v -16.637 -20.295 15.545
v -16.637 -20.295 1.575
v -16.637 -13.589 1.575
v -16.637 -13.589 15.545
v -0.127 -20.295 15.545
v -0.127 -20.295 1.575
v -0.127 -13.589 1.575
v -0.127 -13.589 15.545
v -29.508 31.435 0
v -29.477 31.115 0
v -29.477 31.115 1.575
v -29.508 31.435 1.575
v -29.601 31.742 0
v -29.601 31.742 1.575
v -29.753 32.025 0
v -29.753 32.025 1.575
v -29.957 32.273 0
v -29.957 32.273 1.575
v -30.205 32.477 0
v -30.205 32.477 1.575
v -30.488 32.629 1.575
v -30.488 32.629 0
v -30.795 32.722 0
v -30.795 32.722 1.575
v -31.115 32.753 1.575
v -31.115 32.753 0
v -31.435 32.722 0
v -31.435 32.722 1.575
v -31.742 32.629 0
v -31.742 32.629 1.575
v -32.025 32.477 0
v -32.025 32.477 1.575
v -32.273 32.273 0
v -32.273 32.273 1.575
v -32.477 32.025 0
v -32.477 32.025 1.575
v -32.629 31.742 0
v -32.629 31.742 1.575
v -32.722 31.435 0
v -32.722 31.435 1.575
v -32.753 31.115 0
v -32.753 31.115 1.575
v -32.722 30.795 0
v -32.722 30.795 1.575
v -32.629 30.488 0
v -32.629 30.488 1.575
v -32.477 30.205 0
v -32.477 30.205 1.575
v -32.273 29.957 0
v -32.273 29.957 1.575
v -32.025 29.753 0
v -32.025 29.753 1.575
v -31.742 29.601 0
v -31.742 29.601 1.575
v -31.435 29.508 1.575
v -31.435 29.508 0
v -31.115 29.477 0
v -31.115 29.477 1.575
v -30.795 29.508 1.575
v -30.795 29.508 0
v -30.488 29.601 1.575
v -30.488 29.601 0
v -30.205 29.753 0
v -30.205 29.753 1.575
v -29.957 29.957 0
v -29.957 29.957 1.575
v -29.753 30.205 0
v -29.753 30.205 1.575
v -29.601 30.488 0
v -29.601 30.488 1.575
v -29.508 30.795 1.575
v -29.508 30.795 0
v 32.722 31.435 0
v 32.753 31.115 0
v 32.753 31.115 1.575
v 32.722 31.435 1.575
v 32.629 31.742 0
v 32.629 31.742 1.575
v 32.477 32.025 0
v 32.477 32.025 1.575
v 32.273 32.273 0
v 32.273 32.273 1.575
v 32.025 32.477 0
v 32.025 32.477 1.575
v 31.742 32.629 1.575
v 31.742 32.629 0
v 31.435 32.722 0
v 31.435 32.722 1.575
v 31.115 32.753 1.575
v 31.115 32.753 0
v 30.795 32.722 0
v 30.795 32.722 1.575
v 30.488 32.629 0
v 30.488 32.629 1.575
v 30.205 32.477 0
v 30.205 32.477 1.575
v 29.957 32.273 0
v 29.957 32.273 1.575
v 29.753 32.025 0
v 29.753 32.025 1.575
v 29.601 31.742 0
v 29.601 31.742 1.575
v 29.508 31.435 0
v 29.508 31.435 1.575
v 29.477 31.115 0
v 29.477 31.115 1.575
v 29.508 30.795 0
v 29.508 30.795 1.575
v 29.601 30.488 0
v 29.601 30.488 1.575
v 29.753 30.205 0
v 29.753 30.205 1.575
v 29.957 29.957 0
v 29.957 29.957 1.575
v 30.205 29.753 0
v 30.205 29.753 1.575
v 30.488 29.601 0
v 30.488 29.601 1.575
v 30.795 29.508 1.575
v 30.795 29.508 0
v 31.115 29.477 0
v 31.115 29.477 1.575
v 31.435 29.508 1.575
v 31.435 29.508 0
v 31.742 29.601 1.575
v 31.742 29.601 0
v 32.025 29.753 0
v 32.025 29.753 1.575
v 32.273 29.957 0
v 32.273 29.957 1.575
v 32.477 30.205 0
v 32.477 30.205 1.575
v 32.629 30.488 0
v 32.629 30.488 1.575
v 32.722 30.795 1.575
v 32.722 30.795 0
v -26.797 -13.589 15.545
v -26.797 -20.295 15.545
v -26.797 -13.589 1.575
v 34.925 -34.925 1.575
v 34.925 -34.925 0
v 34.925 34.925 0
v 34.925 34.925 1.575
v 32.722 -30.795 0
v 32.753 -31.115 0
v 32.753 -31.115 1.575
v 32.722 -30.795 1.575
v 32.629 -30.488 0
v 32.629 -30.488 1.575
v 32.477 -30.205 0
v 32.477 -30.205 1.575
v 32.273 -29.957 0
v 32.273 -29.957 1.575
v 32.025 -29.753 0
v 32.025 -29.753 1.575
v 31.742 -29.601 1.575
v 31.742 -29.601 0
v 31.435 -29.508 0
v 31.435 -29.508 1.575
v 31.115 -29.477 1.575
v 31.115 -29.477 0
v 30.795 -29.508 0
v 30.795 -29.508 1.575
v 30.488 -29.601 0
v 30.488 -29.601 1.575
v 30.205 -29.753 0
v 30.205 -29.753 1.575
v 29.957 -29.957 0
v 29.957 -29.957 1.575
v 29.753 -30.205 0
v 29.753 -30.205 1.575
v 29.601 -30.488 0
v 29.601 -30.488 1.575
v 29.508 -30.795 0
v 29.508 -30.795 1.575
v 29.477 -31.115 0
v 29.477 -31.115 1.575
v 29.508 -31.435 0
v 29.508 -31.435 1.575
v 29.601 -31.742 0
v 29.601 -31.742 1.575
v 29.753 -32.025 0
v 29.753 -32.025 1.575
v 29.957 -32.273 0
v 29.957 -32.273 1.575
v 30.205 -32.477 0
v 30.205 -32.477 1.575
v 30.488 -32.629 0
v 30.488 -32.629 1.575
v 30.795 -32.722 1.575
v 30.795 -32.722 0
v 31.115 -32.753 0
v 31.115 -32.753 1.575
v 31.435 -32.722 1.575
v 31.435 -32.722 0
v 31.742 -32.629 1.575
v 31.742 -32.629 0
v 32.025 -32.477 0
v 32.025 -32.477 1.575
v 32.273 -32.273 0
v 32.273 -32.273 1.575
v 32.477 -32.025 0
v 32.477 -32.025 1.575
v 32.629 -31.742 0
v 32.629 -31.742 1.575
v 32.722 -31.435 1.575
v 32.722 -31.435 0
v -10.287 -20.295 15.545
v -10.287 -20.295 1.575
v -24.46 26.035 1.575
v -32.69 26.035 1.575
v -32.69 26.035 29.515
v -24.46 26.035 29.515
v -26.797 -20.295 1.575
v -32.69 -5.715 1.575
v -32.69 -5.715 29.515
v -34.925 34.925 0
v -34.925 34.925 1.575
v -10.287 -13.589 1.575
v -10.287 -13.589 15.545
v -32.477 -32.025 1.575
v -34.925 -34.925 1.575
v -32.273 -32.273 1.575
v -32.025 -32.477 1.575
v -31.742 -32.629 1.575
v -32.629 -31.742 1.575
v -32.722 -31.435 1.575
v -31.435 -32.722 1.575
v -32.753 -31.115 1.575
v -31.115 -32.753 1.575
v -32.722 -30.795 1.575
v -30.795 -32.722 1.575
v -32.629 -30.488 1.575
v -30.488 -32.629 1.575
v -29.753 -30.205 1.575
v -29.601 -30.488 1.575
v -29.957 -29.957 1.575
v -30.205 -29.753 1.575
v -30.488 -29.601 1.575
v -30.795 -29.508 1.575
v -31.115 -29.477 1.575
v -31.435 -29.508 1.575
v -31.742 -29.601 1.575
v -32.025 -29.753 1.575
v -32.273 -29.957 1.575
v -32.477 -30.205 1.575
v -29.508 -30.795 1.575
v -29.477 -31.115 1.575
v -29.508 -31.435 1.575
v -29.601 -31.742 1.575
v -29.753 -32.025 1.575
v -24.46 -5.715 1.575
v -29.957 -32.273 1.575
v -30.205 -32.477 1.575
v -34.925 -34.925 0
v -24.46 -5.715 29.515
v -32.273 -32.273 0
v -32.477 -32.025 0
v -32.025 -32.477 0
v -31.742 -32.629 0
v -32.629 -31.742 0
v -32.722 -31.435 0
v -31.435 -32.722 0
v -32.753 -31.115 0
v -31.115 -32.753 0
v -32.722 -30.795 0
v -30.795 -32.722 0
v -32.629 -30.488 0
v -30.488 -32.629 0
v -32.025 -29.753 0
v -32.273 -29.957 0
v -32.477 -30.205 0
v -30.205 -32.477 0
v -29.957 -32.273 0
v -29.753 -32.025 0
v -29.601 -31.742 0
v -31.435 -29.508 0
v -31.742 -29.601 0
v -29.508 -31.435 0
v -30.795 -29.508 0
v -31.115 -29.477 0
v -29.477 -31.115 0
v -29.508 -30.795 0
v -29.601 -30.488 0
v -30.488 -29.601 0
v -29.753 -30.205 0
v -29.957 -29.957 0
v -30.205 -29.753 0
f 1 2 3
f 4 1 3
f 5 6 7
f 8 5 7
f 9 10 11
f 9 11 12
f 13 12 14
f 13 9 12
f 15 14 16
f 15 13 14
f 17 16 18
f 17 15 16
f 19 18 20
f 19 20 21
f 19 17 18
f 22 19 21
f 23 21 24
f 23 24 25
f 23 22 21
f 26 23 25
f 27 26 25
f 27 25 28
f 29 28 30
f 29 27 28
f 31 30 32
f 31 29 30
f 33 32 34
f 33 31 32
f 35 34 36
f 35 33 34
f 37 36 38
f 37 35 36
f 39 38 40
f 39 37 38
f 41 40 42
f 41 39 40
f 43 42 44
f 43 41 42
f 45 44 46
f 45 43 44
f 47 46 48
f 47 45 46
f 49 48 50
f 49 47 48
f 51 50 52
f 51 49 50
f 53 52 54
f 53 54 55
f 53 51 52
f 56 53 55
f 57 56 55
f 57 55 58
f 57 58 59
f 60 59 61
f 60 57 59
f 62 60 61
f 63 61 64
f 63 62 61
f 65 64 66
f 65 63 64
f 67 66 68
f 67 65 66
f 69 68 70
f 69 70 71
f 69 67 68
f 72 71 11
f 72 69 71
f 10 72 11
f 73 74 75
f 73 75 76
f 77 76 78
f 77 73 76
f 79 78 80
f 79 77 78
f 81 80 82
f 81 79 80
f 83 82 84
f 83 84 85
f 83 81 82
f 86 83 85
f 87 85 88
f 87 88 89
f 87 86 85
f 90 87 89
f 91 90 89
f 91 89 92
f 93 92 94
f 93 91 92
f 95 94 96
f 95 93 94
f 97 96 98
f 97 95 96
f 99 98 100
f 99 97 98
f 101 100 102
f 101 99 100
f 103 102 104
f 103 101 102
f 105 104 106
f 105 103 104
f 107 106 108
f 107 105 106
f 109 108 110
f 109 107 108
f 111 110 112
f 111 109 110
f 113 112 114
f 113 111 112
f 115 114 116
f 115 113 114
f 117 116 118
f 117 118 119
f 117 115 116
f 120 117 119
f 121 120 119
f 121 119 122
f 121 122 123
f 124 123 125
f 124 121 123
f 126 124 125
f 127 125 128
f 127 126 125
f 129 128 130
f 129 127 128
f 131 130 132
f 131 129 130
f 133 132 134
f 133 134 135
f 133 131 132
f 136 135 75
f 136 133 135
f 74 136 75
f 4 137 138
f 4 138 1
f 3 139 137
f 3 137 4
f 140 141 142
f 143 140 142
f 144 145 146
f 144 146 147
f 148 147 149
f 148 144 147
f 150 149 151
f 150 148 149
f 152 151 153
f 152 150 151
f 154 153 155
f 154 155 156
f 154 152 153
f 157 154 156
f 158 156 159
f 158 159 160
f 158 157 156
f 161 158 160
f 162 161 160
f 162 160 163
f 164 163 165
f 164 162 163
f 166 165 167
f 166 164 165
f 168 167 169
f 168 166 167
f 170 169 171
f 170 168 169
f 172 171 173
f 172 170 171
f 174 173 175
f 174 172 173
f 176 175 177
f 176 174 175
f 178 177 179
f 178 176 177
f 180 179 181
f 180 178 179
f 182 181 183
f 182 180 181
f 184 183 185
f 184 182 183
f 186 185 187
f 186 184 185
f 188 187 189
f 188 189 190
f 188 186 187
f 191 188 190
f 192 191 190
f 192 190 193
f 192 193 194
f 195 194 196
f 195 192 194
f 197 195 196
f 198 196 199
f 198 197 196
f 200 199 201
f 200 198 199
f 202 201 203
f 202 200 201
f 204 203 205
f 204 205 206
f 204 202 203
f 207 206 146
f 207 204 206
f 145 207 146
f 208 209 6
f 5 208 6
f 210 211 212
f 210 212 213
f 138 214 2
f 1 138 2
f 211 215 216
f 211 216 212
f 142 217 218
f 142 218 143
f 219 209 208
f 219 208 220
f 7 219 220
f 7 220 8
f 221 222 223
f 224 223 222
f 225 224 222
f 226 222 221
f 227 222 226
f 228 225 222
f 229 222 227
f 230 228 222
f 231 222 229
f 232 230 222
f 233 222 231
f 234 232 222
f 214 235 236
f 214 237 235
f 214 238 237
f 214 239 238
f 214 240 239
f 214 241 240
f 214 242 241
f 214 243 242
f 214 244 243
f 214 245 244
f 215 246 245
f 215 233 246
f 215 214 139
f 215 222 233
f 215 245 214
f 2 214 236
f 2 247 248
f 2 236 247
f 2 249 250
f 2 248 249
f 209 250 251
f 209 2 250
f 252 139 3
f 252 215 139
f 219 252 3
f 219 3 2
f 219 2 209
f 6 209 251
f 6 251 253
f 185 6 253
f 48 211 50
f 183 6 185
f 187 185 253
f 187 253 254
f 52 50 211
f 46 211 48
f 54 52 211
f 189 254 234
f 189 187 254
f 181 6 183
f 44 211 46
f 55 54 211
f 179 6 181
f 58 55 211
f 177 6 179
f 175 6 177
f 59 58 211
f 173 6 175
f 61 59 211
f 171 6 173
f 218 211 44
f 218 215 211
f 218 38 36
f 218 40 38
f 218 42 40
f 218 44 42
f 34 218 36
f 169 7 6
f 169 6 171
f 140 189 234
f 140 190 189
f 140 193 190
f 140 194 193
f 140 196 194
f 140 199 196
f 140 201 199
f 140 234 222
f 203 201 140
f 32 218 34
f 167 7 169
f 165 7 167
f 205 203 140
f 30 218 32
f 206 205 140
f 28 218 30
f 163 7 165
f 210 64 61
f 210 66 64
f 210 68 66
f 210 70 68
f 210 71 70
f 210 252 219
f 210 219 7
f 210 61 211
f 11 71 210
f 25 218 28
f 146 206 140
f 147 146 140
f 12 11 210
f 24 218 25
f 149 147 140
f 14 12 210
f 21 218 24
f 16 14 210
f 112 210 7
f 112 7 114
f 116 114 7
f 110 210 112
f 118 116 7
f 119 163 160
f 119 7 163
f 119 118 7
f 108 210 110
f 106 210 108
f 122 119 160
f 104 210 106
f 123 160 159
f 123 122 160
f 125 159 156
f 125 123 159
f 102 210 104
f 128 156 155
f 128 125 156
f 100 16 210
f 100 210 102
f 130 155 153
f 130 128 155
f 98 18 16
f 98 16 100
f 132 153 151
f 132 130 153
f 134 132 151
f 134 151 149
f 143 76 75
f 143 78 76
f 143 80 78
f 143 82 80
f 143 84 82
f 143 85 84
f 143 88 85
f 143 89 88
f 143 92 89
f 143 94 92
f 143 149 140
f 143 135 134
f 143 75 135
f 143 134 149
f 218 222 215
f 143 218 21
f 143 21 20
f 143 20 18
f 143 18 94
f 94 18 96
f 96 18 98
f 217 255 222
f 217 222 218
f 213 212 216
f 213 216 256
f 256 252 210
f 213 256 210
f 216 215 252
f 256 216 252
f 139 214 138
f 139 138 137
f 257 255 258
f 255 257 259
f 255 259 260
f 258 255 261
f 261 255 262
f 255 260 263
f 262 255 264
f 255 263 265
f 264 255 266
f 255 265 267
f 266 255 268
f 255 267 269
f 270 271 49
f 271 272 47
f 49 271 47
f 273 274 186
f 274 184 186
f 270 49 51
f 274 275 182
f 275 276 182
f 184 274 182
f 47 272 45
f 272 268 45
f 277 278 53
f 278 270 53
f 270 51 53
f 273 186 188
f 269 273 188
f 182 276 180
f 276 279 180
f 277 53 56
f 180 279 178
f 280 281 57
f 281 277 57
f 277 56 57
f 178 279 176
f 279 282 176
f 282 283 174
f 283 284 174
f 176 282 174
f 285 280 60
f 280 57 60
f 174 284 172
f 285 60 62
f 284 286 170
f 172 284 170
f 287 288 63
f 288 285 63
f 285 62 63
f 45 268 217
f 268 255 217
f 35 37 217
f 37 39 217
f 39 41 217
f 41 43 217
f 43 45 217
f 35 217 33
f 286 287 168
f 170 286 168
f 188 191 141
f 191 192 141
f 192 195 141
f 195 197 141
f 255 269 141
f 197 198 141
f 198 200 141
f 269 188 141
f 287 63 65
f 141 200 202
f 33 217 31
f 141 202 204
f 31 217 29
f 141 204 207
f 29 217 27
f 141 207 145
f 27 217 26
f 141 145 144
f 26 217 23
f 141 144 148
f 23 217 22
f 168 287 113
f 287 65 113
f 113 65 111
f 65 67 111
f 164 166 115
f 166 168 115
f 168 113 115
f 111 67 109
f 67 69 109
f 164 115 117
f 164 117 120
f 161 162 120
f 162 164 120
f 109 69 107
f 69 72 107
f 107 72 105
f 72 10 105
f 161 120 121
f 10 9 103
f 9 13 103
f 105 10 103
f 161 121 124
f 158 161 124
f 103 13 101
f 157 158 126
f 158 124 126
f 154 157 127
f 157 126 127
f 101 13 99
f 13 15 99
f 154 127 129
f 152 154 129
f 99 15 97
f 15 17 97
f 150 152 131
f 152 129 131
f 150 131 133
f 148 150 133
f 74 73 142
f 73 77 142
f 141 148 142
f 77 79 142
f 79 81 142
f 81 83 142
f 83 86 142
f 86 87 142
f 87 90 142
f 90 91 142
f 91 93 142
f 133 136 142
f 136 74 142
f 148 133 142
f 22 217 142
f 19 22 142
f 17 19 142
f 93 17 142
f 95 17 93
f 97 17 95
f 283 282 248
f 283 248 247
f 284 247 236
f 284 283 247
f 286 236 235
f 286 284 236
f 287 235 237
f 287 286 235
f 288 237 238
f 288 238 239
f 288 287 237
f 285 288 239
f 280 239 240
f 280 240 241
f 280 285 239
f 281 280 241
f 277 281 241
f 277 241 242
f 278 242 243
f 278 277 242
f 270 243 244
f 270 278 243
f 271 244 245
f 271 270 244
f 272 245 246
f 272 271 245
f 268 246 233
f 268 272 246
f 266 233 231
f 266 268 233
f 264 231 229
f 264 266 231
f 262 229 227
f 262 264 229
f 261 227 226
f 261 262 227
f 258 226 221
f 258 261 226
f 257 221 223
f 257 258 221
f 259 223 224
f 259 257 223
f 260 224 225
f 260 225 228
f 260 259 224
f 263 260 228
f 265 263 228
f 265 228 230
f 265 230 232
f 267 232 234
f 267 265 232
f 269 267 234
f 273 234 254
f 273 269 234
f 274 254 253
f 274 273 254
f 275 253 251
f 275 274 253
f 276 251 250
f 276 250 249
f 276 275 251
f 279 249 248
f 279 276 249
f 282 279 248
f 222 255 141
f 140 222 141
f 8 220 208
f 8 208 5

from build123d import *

# Parameters (mm, degrees)
F0_W     = 69.85
F0_H     = 69.85
F0_R     = 1.6383
F1_DEPTH = 1.5748
F2_W     = 8.2296
F2_H     = 31.75
F3_DEPTH = 27.94
F4_W     = 10.16
F4_H     = 6.7056
F5_DEPTH = 13.97


with BuildPart() as f1:
    # F0 (on Top) → F1 (new body)
    with BuildSketch(Plane.XY):
        Rectangle(F0_W, F0_H)
        with Locations((-31.115, -31.115)):
            Circle(F0_R, mode=Mode.SUBTRACT)
        with Locations((31.115, -31.115)):
            Circle(F0_R, mode=Mode.SUBTRACT)
        with Locations((-31.115, 31.115)):
            Circle(F0_R, mode=Mode.SUBTRACT)
        with Locations((31.115, 31.115)):
            Circle(F0_R, mode=Mode.SUBTRACT)
    extrude(amount=F1_DEPTH)

    # F2 (on face) → F3 (join)
    with BuildSketch(Plane.XY.offset(1.5748)):
        with Locations((-28.575, 10.16)):
            Rectangle(F2_W, F2_H)
    extrude(amount=F3_DEPTH)

    # F4 (on face) → F5 (join)
    with BuildSketch(Plane.XY.offset(1.5748)):
        with Locations((-21.717, -16.9418)):
            Rectangle(F4_W, F4_H)
        with Locations((-5.207, -16.9418)):
            Rectangle(F4_W, F4_H)
    extrude(amount=F5_DEPTH)


solid = f1.part
